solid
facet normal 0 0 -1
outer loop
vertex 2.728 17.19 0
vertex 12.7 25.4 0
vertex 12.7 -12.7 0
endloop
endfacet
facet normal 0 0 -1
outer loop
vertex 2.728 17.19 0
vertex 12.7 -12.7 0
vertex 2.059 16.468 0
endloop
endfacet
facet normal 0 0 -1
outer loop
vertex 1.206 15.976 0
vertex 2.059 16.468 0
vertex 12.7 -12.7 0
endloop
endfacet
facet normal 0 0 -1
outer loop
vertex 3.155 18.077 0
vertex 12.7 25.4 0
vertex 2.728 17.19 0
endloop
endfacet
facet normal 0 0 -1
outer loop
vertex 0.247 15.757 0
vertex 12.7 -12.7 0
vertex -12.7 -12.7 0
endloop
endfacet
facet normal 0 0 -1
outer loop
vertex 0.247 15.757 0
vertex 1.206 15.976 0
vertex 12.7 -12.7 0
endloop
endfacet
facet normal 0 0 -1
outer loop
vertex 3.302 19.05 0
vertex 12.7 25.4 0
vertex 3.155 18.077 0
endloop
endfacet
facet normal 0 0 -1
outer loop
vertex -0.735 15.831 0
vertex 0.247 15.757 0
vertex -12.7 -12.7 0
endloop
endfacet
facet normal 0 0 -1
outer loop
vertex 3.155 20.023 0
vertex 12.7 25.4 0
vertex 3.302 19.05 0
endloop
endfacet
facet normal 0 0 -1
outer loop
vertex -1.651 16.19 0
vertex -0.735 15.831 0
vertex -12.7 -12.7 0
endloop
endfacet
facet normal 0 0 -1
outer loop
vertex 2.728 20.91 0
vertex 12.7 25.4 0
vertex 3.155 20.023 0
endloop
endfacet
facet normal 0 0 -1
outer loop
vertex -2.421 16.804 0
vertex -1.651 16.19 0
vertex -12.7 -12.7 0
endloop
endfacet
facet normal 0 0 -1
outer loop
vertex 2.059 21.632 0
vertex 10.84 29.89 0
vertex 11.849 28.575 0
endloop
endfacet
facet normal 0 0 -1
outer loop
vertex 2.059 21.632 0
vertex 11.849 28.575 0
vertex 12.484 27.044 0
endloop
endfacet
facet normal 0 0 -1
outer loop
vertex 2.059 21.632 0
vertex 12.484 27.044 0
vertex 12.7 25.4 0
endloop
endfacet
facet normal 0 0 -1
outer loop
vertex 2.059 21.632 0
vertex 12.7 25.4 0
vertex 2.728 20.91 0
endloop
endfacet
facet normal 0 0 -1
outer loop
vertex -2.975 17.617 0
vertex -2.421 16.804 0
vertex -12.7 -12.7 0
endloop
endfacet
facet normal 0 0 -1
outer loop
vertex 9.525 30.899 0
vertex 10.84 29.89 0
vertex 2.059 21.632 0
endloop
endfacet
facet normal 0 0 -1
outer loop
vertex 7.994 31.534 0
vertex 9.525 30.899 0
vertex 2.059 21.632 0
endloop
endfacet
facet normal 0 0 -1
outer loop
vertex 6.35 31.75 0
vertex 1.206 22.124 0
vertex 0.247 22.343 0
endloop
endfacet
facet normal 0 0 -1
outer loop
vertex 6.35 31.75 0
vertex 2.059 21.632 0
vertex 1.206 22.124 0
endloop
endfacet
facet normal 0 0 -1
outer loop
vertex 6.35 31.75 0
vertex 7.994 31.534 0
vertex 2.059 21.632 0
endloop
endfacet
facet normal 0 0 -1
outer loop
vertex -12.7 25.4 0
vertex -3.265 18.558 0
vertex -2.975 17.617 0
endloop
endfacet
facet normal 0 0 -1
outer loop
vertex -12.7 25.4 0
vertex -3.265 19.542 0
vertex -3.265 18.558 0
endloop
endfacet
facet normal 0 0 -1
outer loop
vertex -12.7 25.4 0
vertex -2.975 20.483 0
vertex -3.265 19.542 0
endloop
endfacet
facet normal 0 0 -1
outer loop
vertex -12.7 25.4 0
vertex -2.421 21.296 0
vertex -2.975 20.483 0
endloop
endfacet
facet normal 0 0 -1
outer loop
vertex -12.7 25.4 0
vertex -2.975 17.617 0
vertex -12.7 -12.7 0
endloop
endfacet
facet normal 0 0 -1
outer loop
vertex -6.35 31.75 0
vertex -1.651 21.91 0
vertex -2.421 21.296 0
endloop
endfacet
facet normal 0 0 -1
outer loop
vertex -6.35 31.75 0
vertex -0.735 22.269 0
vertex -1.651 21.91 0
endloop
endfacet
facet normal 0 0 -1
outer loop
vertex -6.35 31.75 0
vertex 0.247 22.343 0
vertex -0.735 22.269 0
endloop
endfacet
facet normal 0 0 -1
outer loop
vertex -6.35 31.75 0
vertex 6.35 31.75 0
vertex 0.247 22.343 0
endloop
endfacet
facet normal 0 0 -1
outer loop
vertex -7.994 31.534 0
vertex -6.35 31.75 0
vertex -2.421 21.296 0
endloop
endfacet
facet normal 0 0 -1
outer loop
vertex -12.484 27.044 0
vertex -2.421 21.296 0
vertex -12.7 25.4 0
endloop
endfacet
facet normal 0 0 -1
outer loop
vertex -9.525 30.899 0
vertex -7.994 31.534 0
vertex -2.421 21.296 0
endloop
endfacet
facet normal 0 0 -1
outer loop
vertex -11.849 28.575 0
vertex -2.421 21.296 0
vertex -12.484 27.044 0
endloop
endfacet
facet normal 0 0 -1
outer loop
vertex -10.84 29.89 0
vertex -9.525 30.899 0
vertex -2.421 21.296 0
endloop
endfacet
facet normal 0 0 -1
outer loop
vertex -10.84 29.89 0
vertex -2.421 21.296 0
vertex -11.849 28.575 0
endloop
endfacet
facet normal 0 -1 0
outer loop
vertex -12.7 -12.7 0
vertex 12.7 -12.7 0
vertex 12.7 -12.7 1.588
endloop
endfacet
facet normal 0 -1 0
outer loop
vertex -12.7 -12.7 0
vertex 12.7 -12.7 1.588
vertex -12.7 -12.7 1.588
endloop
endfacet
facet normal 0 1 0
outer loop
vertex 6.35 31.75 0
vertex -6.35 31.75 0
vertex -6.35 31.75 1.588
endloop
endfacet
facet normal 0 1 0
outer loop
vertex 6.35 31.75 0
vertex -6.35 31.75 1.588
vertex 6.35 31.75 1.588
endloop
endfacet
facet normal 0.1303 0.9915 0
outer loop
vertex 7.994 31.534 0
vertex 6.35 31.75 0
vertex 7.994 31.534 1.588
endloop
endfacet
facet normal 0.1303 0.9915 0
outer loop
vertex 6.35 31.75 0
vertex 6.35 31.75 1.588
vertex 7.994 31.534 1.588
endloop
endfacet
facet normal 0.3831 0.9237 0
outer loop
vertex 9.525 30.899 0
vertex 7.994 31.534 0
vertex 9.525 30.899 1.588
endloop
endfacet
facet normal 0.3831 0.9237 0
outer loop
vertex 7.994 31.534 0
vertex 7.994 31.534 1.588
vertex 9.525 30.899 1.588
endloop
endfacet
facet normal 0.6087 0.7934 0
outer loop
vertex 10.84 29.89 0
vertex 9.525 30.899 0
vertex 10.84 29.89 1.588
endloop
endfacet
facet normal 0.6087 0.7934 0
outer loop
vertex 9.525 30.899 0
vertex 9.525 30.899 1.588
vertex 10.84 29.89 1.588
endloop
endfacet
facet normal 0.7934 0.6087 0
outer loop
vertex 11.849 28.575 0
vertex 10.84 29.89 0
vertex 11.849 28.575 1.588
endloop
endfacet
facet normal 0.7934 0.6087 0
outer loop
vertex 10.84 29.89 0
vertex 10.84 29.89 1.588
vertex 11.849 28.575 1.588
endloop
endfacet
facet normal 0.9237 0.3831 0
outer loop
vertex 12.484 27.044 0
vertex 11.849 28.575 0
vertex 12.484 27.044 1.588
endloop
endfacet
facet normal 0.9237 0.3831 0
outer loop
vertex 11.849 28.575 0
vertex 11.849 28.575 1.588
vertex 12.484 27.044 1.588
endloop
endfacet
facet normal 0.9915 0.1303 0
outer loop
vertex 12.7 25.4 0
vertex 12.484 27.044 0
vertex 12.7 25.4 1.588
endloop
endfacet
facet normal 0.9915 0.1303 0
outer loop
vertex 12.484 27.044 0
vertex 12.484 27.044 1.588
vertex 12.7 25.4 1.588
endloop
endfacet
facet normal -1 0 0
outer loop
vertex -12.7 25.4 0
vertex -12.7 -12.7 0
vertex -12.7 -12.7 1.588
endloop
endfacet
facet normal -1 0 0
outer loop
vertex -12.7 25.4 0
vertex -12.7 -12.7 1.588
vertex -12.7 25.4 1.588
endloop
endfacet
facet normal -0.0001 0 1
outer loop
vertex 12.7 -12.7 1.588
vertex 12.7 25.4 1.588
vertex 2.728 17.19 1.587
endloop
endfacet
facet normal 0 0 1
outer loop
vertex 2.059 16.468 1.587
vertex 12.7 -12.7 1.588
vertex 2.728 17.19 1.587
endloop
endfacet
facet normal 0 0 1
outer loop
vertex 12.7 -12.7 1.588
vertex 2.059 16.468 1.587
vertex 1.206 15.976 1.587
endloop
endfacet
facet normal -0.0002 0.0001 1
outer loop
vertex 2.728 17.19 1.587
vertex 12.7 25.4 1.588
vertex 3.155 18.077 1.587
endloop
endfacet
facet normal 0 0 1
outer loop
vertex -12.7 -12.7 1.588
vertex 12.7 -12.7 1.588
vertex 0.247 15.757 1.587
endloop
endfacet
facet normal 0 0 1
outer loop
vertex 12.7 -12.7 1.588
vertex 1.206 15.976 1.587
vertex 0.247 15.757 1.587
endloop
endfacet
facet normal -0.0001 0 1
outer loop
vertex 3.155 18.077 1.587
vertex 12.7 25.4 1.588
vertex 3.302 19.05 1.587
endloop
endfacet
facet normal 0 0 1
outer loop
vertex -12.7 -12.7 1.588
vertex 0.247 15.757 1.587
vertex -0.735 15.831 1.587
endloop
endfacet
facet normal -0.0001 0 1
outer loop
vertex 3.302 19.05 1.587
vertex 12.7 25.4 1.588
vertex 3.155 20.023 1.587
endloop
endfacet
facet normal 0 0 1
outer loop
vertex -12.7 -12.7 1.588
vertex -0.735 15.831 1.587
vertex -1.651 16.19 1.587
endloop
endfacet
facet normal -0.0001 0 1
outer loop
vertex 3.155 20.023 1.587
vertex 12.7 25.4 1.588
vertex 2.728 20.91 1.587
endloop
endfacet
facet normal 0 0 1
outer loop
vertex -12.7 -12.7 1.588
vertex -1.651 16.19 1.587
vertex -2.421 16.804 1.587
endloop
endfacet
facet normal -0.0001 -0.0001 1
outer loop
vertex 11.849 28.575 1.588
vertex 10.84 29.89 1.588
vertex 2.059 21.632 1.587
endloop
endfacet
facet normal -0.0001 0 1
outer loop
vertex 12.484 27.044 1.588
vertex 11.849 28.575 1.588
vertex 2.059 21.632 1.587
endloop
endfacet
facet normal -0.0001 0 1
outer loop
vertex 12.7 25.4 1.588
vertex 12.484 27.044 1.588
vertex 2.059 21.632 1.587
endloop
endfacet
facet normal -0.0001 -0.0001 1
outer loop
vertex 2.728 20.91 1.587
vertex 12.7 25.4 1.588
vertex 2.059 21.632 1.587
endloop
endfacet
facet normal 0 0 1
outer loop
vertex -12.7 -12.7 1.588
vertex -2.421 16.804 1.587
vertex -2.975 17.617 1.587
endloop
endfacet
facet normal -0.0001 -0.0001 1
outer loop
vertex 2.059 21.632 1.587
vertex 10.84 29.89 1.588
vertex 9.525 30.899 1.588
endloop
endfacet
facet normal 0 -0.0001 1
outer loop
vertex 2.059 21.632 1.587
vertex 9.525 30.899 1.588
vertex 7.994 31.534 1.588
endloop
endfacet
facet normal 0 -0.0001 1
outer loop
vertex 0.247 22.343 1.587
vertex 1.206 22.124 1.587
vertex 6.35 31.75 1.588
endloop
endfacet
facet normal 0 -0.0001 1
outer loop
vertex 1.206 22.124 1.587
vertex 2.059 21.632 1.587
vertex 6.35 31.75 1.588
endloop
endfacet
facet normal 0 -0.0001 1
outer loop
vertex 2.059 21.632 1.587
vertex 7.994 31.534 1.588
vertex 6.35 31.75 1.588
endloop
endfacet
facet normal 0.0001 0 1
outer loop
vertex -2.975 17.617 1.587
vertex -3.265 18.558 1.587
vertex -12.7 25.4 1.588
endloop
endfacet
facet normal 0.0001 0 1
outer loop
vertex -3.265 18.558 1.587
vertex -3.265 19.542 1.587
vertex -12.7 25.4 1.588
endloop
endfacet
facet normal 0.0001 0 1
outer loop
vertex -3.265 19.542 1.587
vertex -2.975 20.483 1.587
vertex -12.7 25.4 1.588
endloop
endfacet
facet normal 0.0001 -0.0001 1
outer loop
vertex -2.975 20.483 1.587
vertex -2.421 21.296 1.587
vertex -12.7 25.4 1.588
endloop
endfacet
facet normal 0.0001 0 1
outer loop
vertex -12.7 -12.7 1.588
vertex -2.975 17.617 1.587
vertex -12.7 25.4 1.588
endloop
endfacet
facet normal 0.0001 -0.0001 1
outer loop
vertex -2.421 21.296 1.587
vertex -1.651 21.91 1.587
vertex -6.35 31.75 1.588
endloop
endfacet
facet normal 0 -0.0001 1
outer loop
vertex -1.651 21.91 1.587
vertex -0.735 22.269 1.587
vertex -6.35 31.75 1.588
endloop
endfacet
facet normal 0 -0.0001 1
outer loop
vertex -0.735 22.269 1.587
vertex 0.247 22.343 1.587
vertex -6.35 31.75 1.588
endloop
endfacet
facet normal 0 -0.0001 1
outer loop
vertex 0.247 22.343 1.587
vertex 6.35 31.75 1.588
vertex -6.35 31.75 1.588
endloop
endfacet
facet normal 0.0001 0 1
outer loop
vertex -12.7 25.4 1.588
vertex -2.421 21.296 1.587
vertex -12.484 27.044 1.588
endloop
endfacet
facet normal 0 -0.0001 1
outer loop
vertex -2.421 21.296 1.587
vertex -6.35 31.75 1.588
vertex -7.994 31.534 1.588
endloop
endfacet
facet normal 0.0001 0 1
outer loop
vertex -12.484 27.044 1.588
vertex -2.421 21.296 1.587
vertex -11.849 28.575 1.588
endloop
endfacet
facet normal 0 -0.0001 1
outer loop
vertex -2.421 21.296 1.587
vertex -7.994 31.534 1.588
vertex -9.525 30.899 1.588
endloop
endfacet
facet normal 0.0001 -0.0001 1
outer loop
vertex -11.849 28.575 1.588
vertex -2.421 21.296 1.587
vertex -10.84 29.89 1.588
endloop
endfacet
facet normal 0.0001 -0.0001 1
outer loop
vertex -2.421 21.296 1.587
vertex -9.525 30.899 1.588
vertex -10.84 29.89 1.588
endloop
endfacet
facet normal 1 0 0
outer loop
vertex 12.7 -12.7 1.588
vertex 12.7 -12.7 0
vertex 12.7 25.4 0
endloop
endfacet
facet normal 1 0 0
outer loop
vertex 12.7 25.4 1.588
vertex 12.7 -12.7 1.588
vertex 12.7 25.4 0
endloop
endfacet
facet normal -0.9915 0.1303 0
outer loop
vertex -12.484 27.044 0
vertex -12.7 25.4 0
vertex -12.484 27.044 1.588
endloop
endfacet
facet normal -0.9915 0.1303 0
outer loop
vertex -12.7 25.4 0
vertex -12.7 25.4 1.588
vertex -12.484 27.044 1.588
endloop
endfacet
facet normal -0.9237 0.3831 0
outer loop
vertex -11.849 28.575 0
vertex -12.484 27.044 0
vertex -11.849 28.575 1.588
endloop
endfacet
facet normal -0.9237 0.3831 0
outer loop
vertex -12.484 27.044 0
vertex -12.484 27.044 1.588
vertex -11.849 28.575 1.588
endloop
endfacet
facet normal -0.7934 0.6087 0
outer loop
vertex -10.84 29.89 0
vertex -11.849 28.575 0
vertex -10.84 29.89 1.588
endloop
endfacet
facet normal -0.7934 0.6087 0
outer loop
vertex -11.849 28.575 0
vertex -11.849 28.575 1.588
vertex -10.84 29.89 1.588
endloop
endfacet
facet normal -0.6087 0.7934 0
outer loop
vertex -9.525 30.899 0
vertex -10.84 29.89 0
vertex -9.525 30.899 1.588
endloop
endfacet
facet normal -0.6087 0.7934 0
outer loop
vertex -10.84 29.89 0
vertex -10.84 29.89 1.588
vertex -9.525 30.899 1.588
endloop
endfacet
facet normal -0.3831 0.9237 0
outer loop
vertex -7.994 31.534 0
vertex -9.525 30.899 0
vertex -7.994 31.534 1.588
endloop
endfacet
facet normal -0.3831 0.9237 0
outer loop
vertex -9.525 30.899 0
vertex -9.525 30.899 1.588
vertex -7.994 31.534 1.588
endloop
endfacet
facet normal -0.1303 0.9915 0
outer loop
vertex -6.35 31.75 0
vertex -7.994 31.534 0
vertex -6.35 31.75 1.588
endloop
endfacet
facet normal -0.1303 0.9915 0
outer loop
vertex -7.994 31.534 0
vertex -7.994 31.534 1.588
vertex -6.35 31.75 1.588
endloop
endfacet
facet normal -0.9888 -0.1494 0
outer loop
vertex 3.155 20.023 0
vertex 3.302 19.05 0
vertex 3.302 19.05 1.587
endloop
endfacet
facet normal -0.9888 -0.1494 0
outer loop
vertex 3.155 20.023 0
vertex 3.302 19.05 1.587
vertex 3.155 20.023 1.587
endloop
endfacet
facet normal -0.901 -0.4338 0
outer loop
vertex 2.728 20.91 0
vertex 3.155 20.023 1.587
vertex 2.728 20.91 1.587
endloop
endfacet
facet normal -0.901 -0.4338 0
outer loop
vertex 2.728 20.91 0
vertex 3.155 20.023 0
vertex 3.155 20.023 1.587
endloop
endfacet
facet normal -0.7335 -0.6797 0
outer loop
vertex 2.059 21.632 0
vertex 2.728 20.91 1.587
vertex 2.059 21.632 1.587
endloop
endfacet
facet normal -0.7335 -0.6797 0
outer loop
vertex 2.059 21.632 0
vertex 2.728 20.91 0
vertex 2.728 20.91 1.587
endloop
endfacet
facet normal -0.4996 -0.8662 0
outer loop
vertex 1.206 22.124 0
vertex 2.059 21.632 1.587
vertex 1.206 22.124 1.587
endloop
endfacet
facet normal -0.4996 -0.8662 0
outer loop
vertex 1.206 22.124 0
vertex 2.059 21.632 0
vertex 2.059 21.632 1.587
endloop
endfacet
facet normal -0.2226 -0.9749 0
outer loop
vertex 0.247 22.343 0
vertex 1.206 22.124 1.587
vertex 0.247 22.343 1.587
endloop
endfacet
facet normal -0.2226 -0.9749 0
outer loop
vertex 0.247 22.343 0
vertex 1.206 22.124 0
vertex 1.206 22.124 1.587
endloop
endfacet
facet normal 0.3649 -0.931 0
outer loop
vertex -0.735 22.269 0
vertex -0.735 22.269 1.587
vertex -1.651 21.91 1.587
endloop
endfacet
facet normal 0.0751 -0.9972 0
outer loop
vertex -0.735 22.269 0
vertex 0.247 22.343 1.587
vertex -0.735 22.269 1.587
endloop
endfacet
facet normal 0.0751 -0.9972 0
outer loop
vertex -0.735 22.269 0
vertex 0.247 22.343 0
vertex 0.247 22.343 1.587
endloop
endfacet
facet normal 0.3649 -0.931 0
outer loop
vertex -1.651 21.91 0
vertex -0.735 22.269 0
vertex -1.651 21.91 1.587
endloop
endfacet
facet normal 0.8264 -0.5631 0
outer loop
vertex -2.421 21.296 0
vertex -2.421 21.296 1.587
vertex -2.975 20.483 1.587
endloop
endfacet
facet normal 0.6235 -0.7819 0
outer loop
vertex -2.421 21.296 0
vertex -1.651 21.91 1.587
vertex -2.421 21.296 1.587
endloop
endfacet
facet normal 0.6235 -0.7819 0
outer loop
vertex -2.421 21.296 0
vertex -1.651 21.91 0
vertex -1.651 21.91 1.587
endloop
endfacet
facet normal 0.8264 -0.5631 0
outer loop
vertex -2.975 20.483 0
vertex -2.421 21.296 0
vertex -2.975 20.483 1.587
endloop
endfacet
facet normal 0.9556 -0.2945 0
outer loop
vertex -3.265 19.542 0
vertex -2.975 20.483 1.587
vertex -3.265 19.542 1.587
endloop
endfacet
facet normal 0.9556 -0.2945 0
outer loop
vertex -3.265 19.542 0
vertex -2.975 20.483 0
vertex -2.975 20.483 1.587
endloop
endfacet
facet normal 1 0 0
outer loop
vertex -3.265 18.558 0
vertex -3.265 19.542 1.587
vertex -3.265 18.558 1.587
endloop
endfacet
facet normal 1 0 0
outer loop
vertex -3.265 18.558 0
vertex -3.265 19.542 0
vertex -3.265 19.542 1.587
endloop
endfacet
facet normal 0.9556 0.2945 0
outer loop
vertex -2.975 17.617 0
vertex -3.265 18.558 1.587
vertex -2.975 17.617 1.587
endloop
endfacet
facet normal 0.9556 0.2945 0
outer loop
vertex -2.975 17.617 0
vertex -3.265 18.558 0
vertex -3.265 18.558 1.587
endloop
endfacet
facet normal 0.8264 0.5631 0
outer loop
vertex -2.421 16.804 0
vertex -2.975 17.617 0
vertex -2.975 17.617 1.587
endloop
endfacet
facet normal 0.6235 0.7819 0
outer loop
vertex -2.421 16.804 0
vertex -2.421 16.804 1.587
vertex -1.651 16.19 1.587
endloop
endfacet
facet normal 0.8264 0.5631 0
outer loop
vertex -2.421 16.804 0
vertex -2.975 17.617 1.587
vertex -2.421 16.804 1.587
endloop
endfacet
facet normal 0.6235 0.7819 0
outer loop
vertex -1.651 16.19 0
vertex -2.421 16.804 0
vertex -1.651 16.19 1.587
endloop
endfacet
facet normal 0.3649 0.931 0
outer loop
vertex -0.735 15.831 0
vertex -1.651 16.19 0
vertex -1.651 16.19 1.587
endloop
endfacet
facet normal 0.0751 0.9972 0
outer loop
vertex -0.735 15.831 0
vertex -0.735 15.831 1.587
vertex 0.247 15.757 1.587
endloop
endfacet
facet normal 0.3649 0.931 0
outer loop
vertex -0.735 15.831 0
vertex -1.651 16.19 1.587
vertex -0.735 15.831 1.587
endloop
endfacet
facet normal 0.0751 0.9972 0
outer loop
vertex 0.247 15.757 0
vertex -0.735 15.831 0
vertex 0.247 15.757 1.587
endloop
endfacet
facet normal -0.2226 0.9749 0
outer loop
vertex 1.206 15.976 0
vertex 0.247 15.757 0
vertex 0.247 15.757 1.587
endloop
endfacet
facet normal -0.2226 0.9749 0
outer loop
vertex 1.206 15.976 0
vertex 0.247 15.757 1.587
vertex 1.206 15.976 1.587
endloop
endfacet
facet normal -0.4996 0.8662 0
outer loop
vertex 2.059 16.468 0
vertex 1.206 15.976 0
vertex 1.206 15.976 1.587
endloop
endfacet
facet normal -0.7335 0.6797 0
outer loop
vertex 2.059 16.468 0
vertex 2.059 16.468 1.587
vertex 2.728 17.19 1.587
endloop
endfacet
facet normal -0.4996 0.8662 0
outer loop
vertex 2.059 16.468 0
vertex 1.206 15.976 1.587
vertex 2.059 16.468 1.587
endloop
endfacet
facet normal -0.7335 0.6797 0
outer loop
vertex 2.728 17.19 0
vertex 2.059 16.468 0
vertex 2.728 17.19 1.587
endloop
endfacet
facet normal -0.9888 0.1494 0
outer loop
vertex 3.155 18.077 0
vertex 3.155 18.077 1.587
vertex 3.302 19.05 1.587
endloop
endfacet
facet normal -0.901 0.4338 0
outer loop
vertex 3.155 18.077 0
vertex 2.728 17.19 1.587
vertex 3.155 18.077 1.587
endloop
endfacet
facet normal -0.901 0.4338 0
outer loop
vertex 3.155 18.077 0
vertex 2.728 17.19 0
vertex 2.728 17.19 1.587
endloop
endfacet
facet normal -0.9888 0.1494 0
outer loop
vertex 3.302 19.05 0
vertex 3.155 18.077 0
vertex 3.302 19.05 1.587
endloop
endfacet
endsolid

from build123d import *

# Parameters (mm, degrees)
SKETCH1_W               = 25.4
SKETCH1_H               = 31.75
BOSS_EXTRUDE1_DEPTH     = 1.5875
CUT_EXTRUDE1_DEPTH      = 35.232625611
CUT_EXTRUDE1_DEPTH_BACK = 35.232625611
SKETCH2_R               = 3.302
FILLET1_R               = 6.35
SKETCH3_W               = 25.4
SKETCH3_H               = 12.7
BOSS_EXTRUDE2_DEPTH     = 1.5875


with BuildPart() as part:
    # Sketch1 → Boss-Extrude1 (new body)
    with BuildSketch(Plane.XY):
        with Locations((0, 15.875)):
            Rectangle(SKETCH1_W, SKETCH1_H)
    extrude(amount=BOSS_EXTRUDE1_DEPTH)

    # Sketch2 → Cut-Extrude1 (cut, two sides: drawn at the far end of the back side and taken through both)
    with BuildSketch(Plane.XY.offset(1.5875).offset(-CUT_EXTRUDE1_DEPTH_BACK)):
        with Locations((0, 19.05)):
            Circle(SKETCH2_R)
    extrude(amount=CUT_EXTRUDE1_DEPTH + CUT_EXTRUDE1_DEPTH_BACK, mode=Mode.SUBTRACT)

    # Fillet1
    fillet1_edges = [part.edges().sort_by_distance(p)[0] for p in [
        (-12.7, 31.75, 0.79375),
        (12.7, 31.75, 0.79375),
    ]]
    fillet(fillet1_edges, radius=FILLET1_R)

    # Sketch3 → Boss-Extrude2 (add)
    with BuildSketch(Plane(origin=(0, 0, 0), x_dir=(-1, 0, 0), z_dir=(0, 0, -1))):
        with Locations((0, -6.35)):
            Rectangle(SKETCH3_W, SKETCH3_H)
    extrude(amount=-BOSS_EXTRUDE2_DEPTH)


solid = part.part
